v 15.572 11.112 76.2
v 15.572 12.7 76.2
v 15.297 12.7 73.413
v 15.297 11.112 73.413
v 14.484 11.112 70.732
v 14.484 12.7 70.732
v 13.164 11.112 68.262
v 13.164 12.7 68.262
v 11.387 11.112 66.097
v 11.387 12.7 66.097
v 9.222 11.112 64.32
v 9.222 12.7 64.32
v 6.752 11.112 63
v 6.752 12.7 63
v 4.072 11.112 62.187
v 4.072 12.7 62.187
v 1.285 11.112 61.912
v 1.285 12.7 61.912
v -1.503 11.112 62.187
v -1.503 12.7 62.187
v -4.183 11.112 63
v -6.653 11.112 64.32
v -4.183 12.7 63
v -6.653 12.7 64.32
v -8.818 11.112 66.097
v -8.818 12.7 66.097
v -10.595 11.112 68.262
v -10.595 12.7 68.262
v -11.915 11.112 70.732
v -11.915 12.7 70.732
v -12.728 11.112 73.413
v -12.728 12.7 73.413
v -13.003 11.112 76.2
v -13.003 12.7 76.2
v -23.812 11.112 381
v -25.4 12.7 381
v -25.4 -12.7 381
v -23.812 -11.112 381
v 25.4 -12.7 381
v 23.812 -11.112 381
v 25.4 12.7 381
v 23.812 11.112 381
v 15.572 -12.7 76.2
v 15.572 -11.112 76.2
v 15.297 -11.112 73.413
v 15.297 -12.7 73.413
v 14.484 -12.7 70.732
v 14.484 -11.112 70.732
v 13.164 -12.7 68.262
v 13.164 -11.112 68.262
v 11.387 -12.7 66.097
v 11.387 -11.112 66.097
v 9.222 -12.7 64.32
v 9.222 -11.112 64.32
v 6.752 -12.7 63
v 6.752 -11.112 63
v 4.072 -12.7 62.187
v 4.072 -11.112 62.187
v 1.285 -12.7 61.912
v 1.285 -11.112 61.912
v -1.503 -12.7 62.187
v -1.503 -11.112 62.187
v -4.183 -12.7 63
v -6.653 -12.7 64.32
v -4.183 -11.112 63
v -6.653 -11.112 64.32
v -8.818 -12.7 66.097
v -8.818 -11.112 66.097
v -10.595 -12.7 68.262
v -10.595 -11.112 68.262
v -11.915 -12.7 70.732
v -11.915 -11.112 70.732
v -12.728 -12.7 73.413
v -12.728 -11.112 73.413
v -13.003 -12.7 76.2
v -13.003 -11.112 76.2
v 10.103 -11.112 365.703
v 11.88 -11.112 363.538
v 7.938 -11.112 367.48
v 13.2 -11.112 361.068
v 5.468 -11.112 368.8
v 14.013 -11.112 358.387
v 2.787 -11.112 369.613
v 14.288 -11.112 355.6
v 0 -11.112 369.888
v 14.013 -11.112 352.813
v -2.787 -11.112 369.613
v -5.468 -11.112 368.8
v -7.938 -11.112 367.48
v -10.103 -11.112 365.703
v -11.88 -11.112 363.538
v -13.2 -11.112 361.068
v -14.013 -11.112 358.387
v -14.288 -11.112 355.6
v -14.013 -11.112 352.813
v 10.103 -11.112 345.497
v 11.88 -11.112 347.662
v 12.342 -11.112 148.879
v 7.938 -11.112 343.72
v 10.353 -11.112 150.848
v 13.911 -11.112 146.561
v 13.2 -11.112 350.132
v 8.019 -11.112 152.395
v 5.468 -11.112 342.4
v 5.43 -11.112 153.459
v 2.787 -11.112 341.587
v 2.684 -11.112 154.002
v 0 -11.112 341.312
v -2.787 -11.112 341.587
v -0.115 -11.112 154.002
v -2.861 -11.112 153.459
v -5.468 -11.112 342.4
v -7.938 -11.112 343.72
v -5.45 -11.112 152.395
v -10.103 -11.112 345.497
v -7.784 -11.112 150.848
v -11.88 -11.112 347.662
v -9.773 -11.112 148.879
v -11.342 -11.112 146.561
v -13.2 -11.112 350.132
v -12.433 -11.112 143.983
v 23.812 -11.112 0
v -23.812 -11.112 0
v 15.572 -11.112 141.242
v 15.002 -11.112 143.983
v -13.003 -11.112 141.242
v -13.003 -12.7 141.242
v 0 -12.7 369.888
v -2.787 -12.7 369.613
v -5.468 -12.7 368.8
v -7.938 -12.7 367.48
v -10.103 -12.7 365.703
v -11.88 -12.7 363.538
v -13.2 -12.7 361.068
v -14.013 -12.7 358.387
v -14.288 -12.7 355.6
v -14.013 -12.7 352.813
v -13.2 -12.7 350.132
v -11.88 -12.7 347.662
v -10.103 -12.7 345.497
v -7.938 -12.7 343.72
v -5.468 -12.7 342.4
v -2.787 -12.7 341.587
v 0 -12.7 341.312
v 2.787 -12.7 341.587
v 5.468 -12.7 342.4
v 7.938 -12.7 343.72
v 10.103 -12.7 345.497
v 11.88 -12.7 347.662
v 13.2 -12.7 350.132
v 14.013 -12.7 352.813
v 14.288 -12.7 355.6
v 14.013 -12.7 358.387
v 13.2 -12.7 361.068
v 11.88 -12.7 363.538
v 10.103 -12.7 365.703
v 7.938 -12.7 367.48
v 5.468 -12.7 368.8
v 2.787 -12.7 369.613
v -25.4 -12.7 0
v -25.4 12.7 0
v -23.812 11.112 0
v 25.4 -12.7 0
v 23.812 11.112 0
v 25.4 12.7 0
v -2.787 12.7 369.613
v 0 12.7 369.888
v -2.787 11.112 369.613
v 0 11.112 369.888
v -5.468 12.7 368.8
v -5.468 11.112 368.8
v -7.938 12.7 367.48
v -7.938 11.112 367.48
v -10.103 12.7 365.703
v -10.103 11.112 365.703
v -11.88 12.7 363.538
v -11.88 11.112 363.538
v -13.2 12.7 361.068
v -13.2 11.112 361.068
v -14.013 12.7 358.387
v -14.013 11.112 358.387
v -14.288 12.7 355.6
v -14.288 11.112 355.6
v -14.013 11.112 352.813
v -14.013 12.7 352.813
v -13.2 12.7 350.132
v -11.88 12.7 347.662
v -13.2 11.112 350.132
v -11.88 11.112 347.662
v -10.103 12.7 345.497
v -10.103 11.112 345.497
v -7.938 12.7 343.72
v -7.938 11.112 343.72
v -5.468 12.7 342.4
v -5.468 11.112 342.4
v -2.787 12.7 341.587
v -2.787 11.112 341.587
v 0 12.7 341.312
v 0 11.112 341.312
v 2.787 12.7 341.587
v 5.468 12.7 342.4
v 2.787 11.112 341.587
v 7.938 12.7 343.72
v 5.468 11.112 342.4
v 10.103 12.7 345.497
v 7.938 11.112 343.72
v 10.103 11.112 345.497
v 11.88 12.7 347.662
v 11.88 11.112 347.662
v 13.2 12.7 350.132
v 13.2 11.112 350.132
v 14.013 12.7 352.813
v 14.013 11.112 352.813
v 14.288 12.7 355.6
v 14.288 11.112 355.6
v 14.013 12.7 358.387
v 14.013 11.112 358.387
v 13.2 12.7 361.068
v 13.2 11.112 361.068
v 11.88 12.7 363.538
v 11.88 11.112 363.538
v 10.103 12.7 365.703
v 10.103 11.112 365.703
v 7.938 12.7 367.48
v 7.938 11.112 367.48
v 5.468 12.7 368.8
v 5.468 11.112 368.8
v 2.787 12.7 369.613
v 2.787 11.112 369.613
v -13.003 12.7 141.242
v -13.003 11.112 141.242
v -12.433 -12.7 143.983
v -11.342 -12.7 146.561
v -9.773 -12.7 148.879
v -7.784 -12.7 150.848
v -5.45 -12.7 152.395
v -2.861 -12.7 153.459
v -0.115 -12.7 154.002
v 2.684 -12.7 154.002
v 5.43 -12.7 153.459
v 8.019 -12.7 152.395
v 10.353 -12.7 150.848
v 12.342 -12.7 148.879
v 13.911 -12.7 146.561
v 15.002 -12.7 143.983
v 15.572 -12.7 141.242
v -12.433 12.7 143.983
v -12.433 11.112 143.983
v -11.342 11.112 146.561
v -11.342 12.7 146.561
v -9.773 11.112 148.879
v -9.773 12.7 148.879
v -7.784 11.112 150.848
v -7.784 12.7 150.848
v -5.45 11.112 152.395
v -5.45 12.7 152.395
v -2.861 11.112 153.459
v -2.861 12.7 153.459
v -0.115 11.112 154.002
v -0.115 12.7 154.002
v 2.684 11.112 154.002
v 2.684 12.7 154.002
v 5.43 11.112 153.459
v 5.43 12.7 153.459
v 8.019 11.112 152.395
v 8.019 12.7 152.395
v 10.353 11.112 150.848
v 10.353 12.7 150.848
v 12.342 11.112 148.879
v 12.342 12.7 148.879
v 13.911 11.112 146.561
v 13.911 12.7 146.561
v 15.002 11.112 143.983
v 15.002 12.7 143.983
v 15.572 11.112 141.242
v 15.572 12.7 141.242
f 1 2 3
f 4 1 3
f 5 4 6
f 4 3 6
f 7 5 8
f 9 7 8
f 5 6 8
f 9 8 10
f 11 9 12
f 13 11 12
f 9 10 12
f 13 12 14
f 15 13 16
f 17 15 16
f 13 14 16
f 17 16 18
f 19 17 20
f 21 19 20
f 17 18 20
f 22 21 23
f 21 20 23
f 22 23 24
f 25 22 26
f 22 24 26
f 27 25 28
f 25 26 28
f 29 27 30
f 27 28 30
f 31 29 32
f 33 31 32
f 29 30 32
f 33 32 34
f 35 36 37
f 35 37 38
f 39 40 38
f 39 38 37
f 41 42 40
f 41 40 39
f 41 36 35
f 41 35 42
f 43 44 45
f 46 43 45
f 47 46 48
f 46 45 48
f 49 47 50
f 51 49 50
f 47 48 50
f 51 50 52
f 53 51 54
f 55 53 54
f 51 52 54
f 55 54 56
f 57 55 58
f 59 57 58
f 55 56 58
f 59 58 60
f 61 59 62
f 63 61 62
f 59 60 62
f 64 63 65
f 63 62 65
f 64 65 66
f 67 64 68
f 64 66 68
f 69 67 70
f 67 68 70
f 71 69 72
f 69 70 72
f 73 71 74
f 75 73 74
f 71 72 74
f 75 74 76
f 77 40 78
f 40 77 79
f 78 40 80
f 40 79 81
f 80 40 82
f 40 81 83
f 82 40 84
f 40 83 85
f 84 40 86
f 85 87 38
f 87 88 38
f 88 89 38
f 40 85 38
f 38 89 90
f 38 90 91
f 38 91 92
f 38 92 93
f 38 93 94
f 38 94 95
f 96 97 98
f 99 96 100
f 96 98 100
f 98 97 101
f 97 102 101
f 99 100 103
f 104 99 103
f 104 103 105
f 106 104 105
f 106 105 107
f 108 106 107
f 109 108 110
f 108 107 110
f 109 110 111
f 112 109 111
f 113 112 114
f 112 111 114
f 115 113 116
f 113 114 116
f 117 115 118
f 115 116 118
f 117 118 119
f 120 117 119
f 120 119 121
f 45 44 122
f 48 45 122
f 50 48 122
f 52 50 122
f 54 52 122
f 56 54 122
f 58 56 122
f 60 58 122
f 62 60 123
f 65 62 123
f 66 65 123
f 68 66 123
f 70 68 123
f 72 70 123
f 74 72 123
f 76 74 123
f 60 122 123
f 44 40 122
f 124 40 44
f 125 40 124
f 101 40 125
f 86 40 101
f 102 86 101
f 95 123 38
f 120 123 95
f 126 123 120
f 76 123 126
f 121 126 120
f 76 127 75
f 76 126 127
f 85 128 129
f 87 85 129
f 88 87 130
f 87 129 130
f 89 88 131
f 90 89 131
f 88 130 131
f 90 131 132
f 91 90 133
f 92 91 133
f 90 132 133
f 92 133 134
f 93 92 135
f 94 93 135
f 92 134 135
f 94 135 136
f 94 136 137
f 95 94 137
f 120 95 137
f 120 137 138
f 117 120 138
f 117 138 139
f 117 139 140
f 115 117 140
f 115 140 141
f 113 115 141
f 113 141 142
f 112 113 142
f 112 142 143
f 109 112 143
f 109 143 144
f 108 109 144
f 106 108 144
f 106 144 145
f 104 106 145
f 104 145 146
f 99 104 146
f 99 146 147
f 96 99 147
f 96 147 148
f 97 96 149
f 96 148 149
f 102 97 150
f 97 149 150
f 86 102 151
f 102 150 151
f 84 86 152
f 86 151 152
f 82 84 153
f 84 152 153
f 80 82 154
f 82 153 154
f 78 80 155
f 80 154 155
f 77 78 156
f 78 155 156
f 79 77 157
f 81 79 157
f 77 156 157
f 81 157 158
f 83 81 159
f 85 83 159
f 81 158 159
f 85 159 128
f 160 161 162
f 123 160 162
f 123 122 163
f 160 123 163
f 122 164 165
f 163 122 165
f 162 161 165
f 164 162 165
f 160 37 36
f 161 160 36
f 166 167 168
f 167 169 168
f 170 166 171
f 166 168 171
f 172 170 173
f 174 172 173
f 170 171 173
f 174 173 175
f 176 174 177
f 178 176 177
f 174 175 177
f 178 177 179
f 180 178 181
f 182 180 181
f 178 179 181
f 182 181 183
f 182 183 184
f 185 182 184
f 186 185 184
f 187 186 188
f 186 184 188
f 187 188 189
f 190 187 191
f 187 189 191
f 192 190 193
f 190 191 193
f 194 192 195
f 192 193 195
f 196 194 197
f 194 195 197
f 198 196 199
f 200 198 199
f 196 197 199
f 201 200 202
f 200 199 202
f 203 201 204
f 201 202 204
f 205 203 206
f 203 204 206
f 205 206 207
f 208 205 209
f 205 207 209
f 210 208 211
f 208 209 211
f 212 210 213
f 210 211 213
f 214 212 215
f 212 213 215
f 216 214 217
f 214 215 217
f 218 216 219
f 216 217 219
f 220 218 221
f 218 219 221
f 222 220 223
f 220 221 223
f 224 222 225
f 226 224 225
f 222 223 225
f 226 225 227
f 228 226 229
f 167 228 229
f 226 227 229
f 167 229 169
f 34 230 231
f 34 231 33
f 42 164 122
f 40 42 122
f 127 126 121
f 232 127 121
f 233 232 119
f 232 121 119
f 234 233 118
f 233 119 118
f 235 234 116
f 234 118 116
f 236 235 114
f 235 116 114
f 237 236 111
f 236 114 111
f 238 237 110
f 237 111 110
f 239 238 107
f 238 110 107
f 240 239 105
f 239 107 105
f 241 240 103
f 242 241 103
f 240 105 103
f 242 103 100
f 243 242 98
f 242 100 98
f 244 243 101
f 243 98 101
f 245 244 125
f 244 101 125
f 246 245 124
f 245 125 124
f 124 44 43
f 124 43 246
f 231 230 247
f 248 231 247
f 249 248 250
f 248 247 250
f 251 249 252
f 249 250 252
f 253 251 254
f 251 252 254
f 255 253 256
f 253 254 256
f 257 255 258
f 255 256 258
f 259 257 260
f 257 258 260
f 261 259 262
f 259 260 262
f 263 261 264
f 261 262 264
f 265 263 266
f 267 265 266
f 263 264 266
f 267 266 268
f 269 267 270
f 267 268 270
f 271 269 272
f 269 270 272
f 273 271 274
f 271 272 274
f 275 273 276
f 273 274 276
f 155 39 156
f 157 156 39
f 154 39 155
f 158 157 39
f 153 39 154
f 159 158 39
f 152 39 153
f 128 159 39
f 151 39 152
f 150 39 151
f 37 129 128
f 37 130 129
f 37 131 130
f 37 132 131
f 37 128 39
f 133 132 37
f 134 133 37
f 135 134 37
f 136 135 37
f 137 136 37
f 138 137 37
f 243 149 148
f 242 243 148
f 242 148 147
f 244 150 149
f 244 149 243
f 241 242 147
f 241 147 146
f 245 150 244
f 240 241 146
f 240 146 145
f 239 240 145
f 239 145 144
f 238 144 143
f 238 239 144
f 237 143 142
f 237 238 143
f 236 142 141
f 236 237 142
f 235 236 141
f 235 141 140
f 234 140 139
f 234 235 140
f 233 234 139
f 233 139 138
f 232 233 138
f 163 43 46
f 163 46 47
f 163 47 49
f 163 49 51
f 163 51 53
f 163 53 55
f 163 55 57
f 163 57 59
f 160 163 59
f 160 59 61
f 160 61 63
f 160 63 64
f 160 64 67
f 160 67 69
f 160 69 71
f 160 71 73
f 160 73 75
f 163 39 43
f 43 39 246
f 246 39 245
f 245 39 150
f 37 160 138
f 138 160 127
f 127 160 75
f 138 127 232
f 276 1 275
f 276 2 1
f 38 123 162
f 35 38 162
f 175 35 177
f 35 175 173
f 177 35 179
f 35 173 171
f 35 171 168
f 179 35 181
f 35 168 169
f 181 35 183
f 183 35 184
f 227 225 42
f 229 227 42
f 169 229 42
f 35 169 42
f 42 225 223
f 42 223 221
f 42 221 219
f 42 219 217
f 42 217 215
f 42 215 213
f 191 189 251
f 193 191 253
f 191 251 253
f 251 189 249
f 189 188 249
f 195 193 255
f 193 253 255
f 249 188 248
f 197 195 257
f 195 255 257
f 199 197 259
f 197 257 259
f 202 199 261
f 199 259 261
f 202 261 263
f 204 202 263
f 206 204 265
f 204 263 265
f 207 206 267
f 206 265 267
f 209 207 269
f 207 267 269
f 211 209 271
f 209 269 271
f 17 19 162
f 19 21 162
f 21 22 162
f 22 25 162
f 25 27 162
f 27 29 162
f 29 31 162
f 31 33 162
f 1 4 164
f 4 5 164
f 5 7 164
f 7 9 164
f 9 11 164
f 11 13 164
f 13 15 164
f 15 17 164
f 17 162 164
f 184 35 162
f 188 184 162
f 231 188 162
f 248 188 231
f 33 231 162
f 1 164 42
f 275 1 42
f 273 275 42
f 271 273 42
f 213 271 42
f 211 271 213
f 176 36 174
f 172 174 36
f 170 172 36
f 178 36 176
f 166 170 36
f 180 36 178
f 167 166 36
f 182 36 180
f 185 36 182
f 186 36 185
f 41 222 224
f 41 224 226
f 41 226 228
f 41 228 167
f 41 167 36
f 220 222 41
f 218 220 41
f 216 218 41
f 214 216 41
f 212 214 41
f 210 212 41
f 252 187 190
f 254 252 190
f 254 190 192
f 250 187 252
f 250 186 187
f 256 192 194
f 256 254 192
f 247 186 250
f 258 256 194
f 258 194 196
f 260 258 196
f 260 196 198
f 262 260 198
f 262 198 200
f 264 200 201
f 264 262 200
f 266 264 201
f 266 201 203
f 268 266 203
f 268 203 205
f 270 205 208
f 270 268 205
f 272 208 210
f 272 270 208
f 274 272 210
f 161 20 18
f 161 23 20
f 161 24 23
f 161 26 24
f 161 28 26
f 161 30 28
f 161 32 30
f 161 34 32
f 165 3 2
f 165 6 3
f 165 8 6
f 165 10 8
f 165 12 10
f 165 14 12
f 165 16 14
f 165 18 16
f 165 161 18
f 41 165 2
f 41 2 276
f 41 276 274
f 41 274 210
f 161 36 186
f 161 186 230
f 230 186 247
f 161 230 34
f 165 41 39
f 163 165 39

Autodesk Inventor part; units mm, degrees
ref_plane "YZ Plane" through (0, 0, 0) normal (1, 0, 0) x (0, 1, 0)
ref_plane "XZ Plane" through (0, 0, 0) normal (0, 1, 0) x (-1, 0, 0)
ref_plane "XY Plane" through (0, 0, 0) normal (0, 0, 1) x (1, 0, 0)
sketch "Sketch1" plane through (0, 0, 0) normal (0, 0, 1) x (1, 0, 0)
  line L0 (-25.4, 12.7) -> (25.4, 12.7)
  line L1 (25.4, 12.7) -> (25.4, -12.7)
  line L2 (25.4, -12.7) -> (-25.4, -12.7)
  line L3 (-25.4, -12.7) -> (-25.4, 12.7)
  line L4 (-25.4, 12.7) -> (25.4, -12.7) construction
  line L5 (25.4, 12.7) -> (-25.4, -12.7) construction
  line L6 (-23.8125, 11.1125) -> (23.8125, 11.1125)
  line L7 (23.8125, 11.1125) -> (23.8125, -11.1125)
  line L8 (23.8125, -11.1125) -> (-23.8125, -11.1125)
  line L9 (-23.8125, -11.1125) -> (-23.8125, 11.1125)
  line L10 (-23.8125, 11.1125) -> (23.8125, -11.1125) construction
  line L11 (23.8125, 11.1125) -> (-23.8125, -11.1125) construction
  point P0 (0, 0)
  dimension "d0" = 50.8
  dimension "d1" = 25.4
  dimension "d2" = 47.625
  dimension "d3" = 22.225
extrude "Extrusion1" add sketch "Sketch1" along normal blind 381
sketch "Sketch2" plane through (-25.4, 12.7, 0) normal (0, 1, 0) x (1, 0, 0)
  line L0 (0, 0) -> (0, -381) projected
  line L1 (50.8, -381) -> (0, -381) projected
  point P0 (25.4, 0)
  point P1 (25.4, -355.6)
  dimension "d13" = 25.4
  dimension "d14" = 25.4
hole "Hole1" at (0, 12.7, 355.6) direction (0, -1, 0) diameter 28.575 end through all
sketch "Sketch3" plane through (-25.4, 12.7, 0) normal (0, 1, 0) x (1, 0, 0)
  line L0 (40.972, -76.2) -> (40.972, -141.2421)
  arc A0 (40.972, -76.2) -> (12.397, -76.2) centre (26.6845, -76.2) ccw
  line L1 (12.397, -141.2421) -> (12.397, -76.2)
  arc A1 (12.397, -141.2421) -> (40.972, -141.2421) centre (26.6845, -139.7) ccw
  line L2 (50.8, 0) -> (0, 0) projected
  line L3 (50.8, -381) -> (0, -381) projected
  circle A2 centre (25.4, -355.6) radius 14.2875 projected
  point P0 (25.4, 0)
  dimension "d15" = 28.575
  dimension "d18" = 304.8
  dimension "d24" = 215.9
  dimension "d25" = 63.5
extrude "Extrusion2" cut sketch "Sketch3" against normal through all contours L0 A1 L1 A0
properties part number "Frame" material "Aluminum 6061"
